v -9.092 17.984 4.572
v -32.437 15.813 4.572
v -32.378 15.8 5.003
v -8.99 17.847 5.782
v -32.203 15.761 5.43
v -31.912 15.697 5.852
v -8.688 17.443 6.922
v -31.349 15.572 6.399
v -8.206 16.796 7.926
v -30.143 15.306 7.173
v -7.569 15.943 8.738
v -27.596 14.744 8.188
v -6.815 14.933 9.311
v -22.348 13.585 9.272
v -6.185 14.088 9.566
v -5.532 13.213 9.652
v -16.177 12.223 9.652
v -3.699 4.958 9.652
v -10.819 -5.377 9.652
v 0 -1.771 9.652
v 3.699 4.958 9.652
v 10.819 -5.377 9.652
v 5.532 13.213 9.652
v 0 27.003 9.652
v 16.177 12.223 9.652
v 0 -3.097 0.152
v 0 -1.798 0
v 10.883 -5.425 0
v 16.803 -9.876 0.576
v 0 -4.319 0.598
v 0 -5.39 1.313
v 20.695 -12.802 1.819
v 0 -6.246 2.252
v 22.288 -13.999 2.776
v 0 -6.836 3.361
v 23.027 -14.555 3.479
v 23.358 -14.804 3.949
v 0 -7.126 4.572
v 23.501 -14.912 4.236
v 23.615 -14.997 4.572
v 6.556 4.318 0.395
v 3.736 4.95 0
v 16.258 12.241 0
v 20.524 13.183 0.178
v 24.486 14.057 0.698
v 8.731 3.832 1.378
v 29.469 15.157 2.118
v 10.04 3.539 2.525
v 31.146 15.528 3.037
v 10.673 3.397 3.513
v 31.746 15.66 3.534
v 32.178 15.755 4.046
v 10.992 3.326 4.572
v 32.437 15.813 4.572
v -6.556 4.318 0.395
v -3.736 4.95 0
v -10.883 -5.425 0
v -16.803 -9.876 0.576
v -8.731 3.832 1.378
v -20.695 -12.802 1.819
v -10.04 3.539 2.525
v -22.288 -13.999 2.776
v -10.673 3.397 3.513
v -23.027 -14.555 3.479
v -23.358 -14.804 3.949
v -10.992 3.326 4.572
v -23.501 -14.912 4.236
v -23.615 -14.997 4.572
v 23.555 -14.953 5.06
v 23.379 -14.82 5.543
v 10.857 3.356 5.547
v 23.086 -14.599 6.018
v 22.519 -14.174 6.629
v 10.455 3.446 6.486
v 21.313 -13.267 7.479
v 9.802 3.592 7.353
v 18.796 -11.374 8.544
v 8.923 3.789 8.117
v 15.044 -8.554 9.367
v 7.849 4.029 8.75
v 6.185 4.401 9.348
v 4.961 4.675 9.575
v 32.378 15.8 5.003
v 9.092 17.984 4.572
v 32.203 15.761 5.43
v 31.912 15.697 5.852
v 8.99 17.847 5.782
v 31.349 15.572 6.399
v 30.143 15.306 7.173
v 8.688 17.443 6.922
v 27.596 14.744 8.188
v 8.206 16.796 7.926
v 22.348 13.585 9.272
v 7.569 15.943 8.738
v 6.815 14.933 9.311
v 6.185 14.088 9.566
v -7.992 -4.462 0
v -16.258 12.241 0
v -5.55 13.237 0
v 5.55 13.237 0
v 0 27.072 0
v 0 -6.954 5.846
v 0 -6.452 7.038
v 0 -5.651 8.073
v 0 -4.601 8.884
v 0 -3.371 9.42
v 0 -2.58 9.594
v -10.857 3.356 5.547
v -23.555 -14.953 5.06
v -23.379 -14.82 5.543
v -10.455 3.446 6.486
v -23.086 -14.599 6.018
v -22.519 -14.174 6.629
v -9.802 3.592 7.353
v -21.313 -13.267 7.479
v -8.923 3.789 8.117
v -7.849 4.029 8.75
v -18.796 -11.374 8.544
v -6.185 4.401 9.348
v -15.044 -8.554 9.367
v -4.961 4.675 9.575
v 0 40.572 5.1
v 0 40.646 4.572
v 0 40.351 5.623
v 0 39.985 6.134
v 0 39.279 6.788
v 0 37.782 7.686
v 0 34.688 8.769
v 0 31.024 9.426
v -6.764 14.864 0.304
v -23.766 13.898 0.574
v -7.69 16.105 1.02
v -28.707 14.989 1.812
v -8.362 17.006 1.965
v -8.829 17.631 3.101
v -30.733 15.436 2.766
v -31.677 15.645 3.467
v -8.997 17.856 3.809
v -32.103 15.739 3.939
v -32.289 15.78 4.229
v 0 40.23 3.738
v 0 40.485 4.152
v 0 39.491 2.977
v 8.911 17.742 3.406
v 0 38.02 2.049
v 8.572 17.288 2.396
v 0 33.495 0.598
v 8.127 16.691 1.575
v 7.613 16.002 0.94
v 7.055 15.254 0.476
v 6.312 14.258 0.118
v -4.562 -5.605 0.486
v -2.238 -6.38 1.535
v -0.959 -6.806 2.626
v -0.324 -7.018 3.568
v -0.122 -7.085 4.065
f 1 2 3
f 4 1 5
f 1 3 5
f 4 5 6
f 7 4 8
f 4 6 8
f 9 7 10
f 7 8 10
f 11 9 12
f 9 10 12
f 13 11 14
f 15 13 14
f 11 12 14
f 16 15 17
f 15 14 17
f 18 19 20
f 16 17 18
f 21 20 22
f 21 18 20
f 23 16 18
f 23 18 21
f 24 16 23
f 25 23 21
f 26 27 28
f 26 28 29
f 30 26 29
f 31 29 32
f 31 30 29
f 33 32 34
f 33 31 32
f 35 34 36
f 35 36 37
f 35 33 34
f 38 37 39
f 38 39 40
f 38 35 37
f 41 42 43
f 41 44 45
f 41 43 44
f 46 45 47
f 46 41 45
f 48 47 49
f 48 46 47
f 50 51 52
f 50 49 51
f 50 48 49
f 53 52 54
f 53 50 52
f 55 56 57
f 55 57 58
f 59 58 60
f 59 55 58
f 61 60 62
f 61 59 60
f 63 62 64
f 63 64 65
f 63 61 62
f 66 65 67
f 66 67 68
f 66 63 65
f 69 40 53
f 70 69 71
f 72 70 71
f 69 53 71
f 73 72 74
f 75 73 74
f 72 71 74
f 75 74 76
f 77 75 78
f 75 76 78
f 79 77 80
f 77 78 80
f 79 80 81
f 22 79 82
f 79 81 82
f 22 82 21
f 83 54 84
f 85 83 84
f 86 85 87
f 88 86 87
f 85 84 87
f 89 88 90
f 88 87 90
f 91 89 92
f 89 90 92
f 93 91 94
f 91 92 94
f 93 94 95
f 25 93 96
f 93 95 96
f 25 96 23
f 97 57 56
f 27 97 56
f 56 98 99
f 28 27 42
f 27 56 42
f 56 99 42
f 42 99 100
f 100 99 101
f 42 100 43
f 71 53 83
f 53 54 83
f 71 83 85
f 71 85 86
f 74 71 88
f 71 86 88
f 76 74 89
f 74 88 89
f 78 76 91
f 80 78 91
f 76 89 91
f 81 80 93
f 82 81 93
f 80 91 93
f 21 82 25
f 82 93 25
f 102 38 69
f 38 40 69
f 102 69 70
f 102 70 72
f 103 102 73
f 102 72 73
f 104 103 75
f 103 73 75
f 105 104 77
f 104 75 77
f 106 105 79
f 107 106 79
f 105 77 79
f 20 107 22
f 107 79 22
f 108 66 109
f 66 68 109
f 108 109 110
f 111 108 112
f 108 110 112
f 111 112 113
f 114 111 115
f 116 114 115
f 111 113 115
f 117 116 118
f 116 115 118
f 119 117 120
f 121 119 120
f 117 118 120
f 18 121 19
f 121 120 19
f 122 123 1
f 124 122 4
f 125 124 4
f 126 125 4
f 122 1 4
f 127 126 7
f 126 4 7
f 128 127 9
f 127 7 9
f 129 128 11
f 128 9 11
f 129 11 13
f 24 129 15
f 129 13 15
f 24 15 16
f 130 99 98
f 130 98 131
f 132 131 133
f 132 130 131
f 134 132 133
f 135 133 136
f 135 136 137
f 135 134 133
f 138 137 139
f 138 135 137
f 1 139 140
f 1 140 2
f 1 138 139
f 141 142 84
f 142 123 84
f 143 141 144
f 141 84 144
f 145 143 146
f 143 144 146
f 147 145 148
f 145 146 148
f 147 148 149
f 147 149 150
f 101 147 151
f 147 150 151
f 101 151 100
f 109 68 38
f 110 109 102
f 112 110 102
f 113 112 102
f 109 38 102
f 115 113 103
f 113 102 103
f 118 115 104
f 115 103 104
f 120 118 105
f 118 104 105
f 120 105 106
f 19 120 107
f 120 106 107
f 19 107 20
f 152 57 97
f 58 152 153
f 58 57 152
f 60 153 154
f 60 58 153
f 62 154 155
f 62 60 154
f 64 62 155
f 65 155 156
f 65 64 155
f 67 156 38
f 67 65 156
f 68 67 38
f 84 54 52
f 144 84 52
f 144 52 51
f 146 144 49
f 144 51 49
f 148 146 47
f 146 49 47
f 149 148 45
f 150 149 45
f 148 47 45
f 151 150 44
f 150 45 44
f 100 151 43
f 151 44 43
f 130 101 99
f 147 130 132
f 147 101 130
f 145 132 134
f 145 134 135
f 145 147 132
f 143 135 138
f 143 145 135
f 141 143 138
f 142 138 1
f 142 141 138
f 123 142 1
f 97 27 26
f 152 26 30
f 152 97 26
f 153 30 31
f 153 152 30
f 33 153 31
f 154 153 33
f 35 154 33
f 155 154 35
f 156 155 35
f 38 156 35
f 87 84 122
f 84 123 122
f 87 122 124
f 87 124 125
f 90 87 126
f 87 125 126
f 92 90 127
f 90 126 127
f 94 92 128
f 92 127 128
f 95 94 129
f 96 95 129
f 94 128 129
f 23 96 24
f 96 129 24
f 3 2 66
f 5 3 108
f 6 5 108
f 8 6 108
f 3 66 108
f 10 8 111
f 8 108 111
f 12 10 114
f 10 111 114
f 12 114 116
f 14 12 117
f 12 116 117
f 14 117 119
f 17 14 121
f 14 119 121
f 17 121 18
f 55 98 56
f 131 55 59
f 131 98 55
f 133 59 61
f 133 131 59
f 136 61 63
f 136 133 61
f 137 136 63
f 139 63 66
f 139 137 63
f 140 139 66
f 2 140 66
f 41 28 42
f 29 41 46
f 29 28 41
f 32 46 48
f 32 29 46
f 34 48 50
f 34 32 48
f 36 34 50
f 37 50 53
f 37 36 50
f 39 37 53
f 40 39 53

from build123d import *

# Parameters (mm, degrees)
F1_DEPTH      = 9.652
F2_R          = 5.08
F3_T4_DEPTH   = 48.7182027165
F3_T9_DEPTH   = 49.6907337444
F3_T14_DEPTH  = 49.6907337444
F3_T19_DEPTH  = 48.7182027165
F3_T24_DEPTH  = 50.0877618637
F3_T29_DEPTH  = 47.5225066811
F3_T34_DEPTH  = 50.1646809025
F3_T39_DEPTH  = 50.1646809025
F3_T44_DEPTH  = 47.5225066811
F3_T49_DEPTH  = 50.0877618637
F3_T55_DEPTH  = 49.6907337444
F3_T59_DEPTH  = 48.7182027165
F3_T66_DEPTH  = 49.6907337444
F3_T70_DEPTH  = 48.7182027165
F3_T77_DEPTH  = 50.0877618637
F3_T81_DEPTH  = 47.5225066811
F3_T88_DEPTH  = 50.1646809025
F3_T92_DEPTH  = 50.1646809025
F3_T99_DEPTH  = 47.5225066811
F3_T103_DEPTH = 50.0877618637


# Not quite as in the source:
# - a fillet or chamfer that OpenCascade refuses, or shapes differently, is made with other operations: its cross-section is extruded or revolved along the edge and cut away or added


with BuildPart() as f1:
    # F0 (on Top) → F1 (new body)
    with BuildSketch(Plane.XY):
        Polygon((9.0920295568, 17.9841070124), (0, 40.6463289496), (-9.0920295568, 17.9841070124), (-32.4367642404, 15.8125049123), (-10.9921818601, 3.3257867829), (-23.6146248879, -14.9971136204), (0, -7.1255727671), (23.6146248879, -14.9971136204), (10.9921818601, 3.3257867829), (32.4367642404, 15.8125049123), align=None)
    extrude(amount=F1_DEPTH)

    # F2
    f2_edges = [f1.edges().sort_by_distance(p)[0] for p in [
        (21.714473, 9.569146, 9.652),
        (17.303403, -5.835663, 9.652),
        (11.807312, -11.061343, 9.652),
        (-11.807312, -11.061343, 9.652),
        (-17.303403, -5.835663, 9.652),
        (-21.714473, 9.569146, 9.652),
        (-4.546015, 29.315218, 9.652),
        (4.546015, 29.315218, 9.652),
        (20.764397, 16.898306, 9.652),
        (-20.764397, 16.898306, 9.652),
    ]]
    fillet(f2_edges, radius=F2_R)

    # F3: fillet of radius 5.08 on 10 edges, made by hand


with BuildPart() as f3_tool2:
    # F3_s3 → F3_t4 (new body)
    with BuildSketch(Plane(origin=(43.2821955638, -4.026248662, 0), x_dir=(0, 0, 1), z_dir=(-0.9957012204, 0.0926233213, 0))):
        with BuildLine():
            ThreePointArc((4.572, 18.7489312754), (1.3125711686, 17.1021626927), (0, 13.6943950949))
            Line((0, 13.6943950949), (-0.1016, 13.6943950949))
            Line((-0.1016, 13.6943950949), (-0.1016, 18.7489312754))
            Line((-0.1016, 18.7489312754), (0, 18.8505312754))
            ThreePointArc((0, 18.8505312754), (2.286, 18.8505312754), (4.56184, 18.8500219991))
            Line((4.56184, 18.8500219991), (4.572, 18.7489312754))
        make_face()
    extrude(amount=F3_T4_DEPTH)

    split(bisect_by=Plane(origin=(14.046321235, 5.6353506813, 0), x_dir=(0, 0, 1), z_dir=(0.928092919, 0.3723486723, 0)), keep=Keep.TOP)


with BuildPart() as f1_1:
    add(f1.part)

    # F3_t1: cut F3_tool2
    add(f3_tool2.part, mode=Mode.SUBTRACT)


with BuildPart() as f3_tool7:
    # F3_s8 → F3_t9 (new body)
    with BuildSketch(Plane(origin=(-0.2491670879, 0.6210582369, 0), x_dir=(0, 0, 1), z_dir=(-0.3723486723, 0.928092919, 0))):
        with BuildLine():
            ThreePointArc((4.572, 15.1346066199), (1.3125711686, 13.4878380371), (0, 10.0800704394))
            Line((0, 10.0800704394), (-0.1016, 10.0800704394))
            Line((-0.1016, 10.0800704394), (-0.1016, 15.1346066199))
            Line((-0.1016, 15.1346066199), (0, 15.2362066199))
            ThreePointArc((0, 15.2362066199), (2.286, 15.2362066199), (4.56184, 15.2356973435))
            Line((4.56184, 15.2356973435), (4.572, 15.1346066199))
        make_face()
    extrude(amount=F3_T9_DEPTH)

    split(bisect_by=Plane(origin=(1.7365882856, 18.6683337526, 0), x_dir=(0, 0, 1), z_dir=(0.0926233213, 0.9957012204, 0)), keep=Keep.TOP)


with BuildPart() as f1_2:
    add(f1_1.part)

    # F3_t6: cut F3_tool7
    add(f3_tool7.part, mode=Mode.SUBTRACT)


with BuildPart() as f3_tool12:
    # F3_s13 → F3_t14 (new body)
    with BuildSketch(Plane(origin=(18.7514458253, 46.7386763625, 0), x_dir=(0, 0, 1), z_dir=(-0.3723486723, -0.928092919, 0))):
        with BuildLine():
            ThreePointArc((0, 10.0800704394), (1.3125711686, 13.4878380371), (4.572, 15.1346066199))
            Line((4.572, 15.1346066199), (4.56184, 15.2356973435))
            ThreePointArc((4.56184, 15.2356973435), (2.286, 15.2362066199), (0, 15.2362066199))
            Line((0, 15.2362066199), (-0.1016, 15.1346066199))
            Line((-0.1016, 15.1346066199), (-0.1016, 10.0800704394))
            Line((-0.1016, 10.0800704394), (0, 10.0800704394))
        make_face()
    extrude(amount=F3_T14_DEPTH)

    split(bisect_by=Plane(origin=(-1.7365882856, 18.6683337526, 0), x_dir=(0, 0, 1), z_dir=(-0.0926233213, 0.9957012204, 0)), keep=Keep.TOP)


with BuildPart() as f1_3:
    add(f1_2.part)

    # F3_t11: cut F3_tool12
    add(f3_tool12.part, mode=Mode.SUBTRACT)


with BuildPart() as f3_tool17:
    # F3_s18 → F3_t19 (new body)
    with BuildSketch(Plane(origin=(5.2265783378, 0.4861930816, 0), x_dir=(0, 0, 1), z_dir=(-0.9957012204, -0.0926233213, 0))):
        with BuildLine():
            ThreePointArc((0, 13.6943950949), (1.3125711686, 17.1021626927), (4.572, 18.7489312754))
            Line((4.572, 18.7489312754), (4.56184, 18.8500219991))
            ThreePointArc((4.56184, 18.8500219991), (2.286, 18.8505312754), (0, 18.8505312754))
            Line((0, 18.8505312754), (-0.1016, 18.7489312754))
            Line((-0.1016, 18.7489312754), (-0.1016, 13.6943950949))
            Line((-0.1016, 13.6943950949), (0, 13.6943950949))
        make_face()
    extrude(amount=F3_T19_DEPTH)

    split(bisect_by=Plane(origin=(-14.046321235, 5.6353506813, 0), x_dir=(0, 0, 1), z_dir=(-0.928092919, 0.3723486723, 0)), keep=Keep.TOP)


with BuildPart() as f1_4:
    add(f1_3.part)

    # F3_t16: cut F3_tool17
    add(f3_tool17.part, mode=Mode.SUBTRACT)


with BuildPart() as f3_tool22:
    # F3_s23 → F3_t24 (new body)
    with BuildSketch(Plane(origin=(-42.019750379, 24.4671950025, 0), x_dir=(0, 0, 1), z_dir=(0.8641753945, -0.5031907068, 0))):
        with BuildLine():
            ThreePointArc((0, -2.3974355258), (1.3125711686, 1.0103320719), (4.572, 2.6571006547))
            Line((4.572, 2.6571006547), (4.56184, 2.7581913783))
            ThreePointArc((4.56184, 2.7581913783), (2.286, 2.7587006547), (0, 2.7587006547))
            Line((0, 2.7587006547), (-0.1016, 2.6571006547))
            Line((-0.1016, 2.6571006547), (-0.1016, -2.3974355258))
            Line((-0.1016, -2.3974355258), (0, -2.3974355258))
        make_face()
    extrude(amount=F3_T24_DEPTH)

    split(bisect_by=Plane(origin=(-9.0082519421, 6.2056849307, 0), x_dir=(0, 0, 1), z_dir=(-0.8235075899, 0.5673052523, 0)), keep=Keep.TOP)


with BuildPart() as f1_5:
    add(f1_4.part)

    # F3_t21: cut F3_tool22
    add(f3_tool22.part, mode=Mode.SUBTRACT)


with BuildPart() as f3_tool27:
    # F3_s28 → F3_t29 (new body)
    with BuildSketch(Plane(origin=(5.1847323903, 7.5262241228, 0), x_dir=(0, 0, 1), z_dir=(-0.5673052523, -0.8235075899, 0))):
        with BuildLine():
            ThreePointArc((0, 5.8843453213), (1.3125711686, 9.292112919), (4.572, 10.9388815018))
            Line((4.572, 10.9388815018), (4.56184, 11.0399722254))
            ThreePointArc((4.56184, 11.0399722254), (2.286, 11.0404815018), (0, 11.0404815018))
            Line((0, 11.0404815018), (-0.1016, 10.9388815018))
            Line((-0.1016, 10.9388815018), (-0.1016, 5.8843453213))
            Line((-0.1016, 5.8843453213), (0, 5.8843453213))
        make_face()
    extrude(amount=F3_T29_DEPTH)

    split(bisect_by=Plane(origin=(-1.3370283566, -2.2962010066, 0), x_dir=(0, 0, 1), z_dir=(-0.5031907068, -0.8641753945, 0)), keep=Keep.TOP)


with BuildPart() as f1_6:
    add(f1_5.part)

    # F3_t26: cut F3_tool27
    add(f3_tool27.part, mode=Mode.SUBTRACT)


with BuildPart() as f3_tool32:
    # F3_s33 → F3_t34 (new body)
    with BuildSketch(Plane(origin=(-37.7401818022, -12.5800593605, 0), x_dir=(0, 0, 1), z_dir=(0.9486833074, 0.316227738, 0))):
        with BuildLine():
            ThreePointArc((0, 1.7053757593), (1.3125711686, 5.1131433571), (4.572, 6.7599119398))
            Line((4.572, 6.7599119398), (4.56184, 6.8610026635))
            ThreePointArc((4.56184, 6.8610026635), (2.286, 6.8615119398), (0, 6.8615119398))
            Line((0, 6.8615119398), (-0.1016, 6.7599119398))
            Line((-0.1016, 6.7599119398), (-0.1016, 1.7053757593))
            Line((-0.1016, 1.7053757593), (0, 1.7053757593))
        make_face()
    extrude(amount=F3_T34_DEPTH)

    split(bisect_by=Plane(origin=(-2.1376716615, -6.4130156168, 0), x_dir=(0, 0, 1), z_dir=(-0.316227738, -0.9486833074, 0)), keep=Keep.TOP)


with BuildPart() as f1_7:
    add(f1_6.part)

    # F3_t31: cut F3_tool32
    add(f3_tool32.part, mode=Mode.SUBTRACT)


with BuildPart() as f3_tool37:
    # F3_s38 → F3_t39 (new body)
    with BuildSketch(Plane(origin=(-9.8502135912, 3.2834042067, 0), x_dir=(0, 0, 1), z_dir=(0.9486833074, -0.316227738, 0))):
        with BuildLine():
            ThreePointArc((0, 1.7053757593), (1.3125711686, 5.1131433571), (4.572, 6.7599119398))
            Line((4.572, 6.7599119398), (4.56184, 6.8610026635))
            ThreePointArc((4.56184, 6.8610026635), (2.286, 6.8615119398), (0, 6.8615119398))
            Line((0, 6.8615119398), (-0.1016, 6.7599119398))
            Line((-0.1016, 6.7599119398), (-0.1016, 1.7053757593))
            Line((-0.1016, 1.7053757593), (0, 1.7053757593))
        make_face()
    extrude(amount=F3_T39_DEPTH)

    split(bisect_by=Plane(origin=(2.1376716615, -6.4130156168, 0), x_dir=(0, 0, 1), z_dir=(0.316227738, -0.9486833074, 0)), keep=Keep.TOP)


with BuildPart() as f1_8:
    add(f1_7.part)

    # F3_t36: cut F3_tool37
    add(f3_tool37.part, mode=Mode.SUBTRACT)


with BuildPart() as f3_tool42:
    # F3_s43 → F3_t44 (new body)
    with BuildSketch(Plane(origin=(21.7750352542, -31.6089208215, 0), x_dir=(0, 0, 1), z_dir=(-0.5673052523, 0.8235075899, 0))):
        with BuildLine():
            ThreePointArc((0, 5.8843453213), (1.3125711686, 9.292112919), (4.572, 10.9388815018))
            Line((4.572, 10.9388815018), (4.56184, 11.0399722254))
            ThreePointArc((4.56184, 11.0399722254), (2.286, 11.0404815018), (0, 11.0404815018))
            Line((0, 11.0404815018), (-0.1016, 10.9388815018))
            Line((-0.1016, 10.9388815018), (-0.1016, 5.8843453213))
            Line((-0.1016, 5.8843453213), (0, 5.8843453213))
        make_face()
    extrude(amount=F3_T44_DEPTH)

    split(bisect_by=Plane(origin=(1.3370283566, -2.2962010066, 0), x_dir=(0, 0, 1), z_dir=(0.5031907068, -0.8641753945, 0)), keep=Keep.TOP)


with BuildPart() as f1_9:
    add(f1_8.part)

    # F3_t41: cut F3_tool42
    add(f3_tool42.part, mode=Mode.SUBTRACT)


with BuildPart() as f3_tool47:
    # F3_s48 → F3_t49 (new body)
    with BuildSketch(Plane(origin=(-1.2648609916, -0.7365012941, 0), x_dir=(0, 0, 1), z_dir=(0.8641753945, 0.5031907068, 0))):
        with BuildLine():
            ThreePointArc((0, -2.3974355258), (1.3125711686, 1.0103320719), (4.572, 2.6571006547))
            Line((4.572, 2.6571006547), (4.56184, 2.7581913783))
            ThreePointArc((4.56184, 2.7581913783), (2.286, 2.7587006547), (0, 2.7587006547))
            Line((0, 2.7587006547), (-0.1016, 2.6571006547))
            Line((-0.1016, 2.6571006547), (-0.1016, -2.3974355258))
            Line((-0.1016, -2.3974355258), (0, -2.3974355258))
        make_face()
    extrude(amount=F3_T49_DEPTH)

    split(bisect_by=Plane(origin=(9.0082519421, 6.2056849307, 0), x_dir=(0, 0, 1), z_dir=(0.8235075899, 0.5673052523, 0)), keep=Keep.TOP)


with BuildPart() as f1_10:
    add(f1_9.part)

    # F3_t46: cut F3_tool47
    add(f3_tool47.part, mode=Mode.SUBTRACT)


with BuildPart() as f3_tool53:
    # F3_s54 → F3_t55 (new body)
    with BuildSketch(Plane(origin=(-0.2491670879, 0.6210582369, 0), x_dir=(0, 0, 1), z_dir=(-0.3723486723, 0.928092919, 0))):
        with BuildLine():
            ThreePointArc((4.572, 15.1346066199), (1.3125711686, 13.4878380371), (0, 10.0800704394))
            Line((0, 10.0800704394), (-0.1016, 10.0800704394))
            Line((-0.1016, 10.0800704394), (-0.1016, 15.1346066199))
            Line((-0.1016, 15.1346066199), (0, 15.2362066199))
            ThreePointArc((0, 15.2362066199), (2.286, 15.2362066199), (4.56184, 15.2356973435))
            Line((4.56184, 15.2356973435), (4.572, 15.1346066199))
        make_face()
    extrude(amount=F3_T55_DEPTH)

    split(bisect_by=Plane(origin=(1.7365882856, 18.6683337526, 0), x_dir=(0, 0, 1), z_dir=(-0.0926233213, -0.9957012204, 0)), keep=Keep.TOP)


with BuildPart() as f3_tool57:
    # F3_s58 → F3_t59 (new body)
    with BuildSketch(Plane(origin=(43.2821955638, -4.026248662, 0), x_dir=(0, 0, 1), z_dir=(-0.9957012204, 0.0926233213, 0))):
        with BuildLine():
            ThreePointArc((4.572, 18.7489312754), (1.3125711686, 17.1021626927), (0, 13.6943950949))
            Line((0, 13.6943950949), (-0.1016, 13.6943950949))
            Line((-0.1016, 13.6943950949), (-0.1016, 18.7489312754))
            Line((-0.1016, 18.7489312754), (0, 18.8505312754))
            ThreePointArc((0, 18.8505312754), (2.286, 18.8505312754), (4.56184, 18.8500219991))
            Line((4.56184, 18.8500219991), (4.572, 18.7489312754))
        make_face()
    extrude(amount=F3_T59_DEPTH)

    split(bisect_by=Plane(origin=(14.046321235, 5.6353506813, 0), x_dir=(0, 0, 1), z_dir=(-0.928092919, -0.3723486723, 0)), keep=Keep.TOP)


with BuildPart() as f3_tool53_1:
    add(f3_tool53.part)

    # F3_t61: intersect F3_tool57
    add(f3_tool57.part, mode=Mode.INTERSECT)


with BuildPart() as f1_11:
    add(f1_10.part)

    # F3_t51: cut F3_tool53
    add(f3_tool53_1.part, mode=Mode.SUBTRACT)


with BuildPart() as f3_tool64:
    # F3_s65 → F3_t66 (new body)
    with BuildSketch(Plane(origin=(18.7514458253, 46.7386763625, 0), x_dir=(0, 0, 1), z_dir=(-0.3723486723, -0.928092919, 0))):
        with BuildLine():
            ThreePointArc((0, 10.0800704394), (1.3125711686, 13.4878380371), (4.572, 15.1346066199))
            Line((4.572, 15.1346066199), (4.56184, 15.2356973435))
            ThreePointArc((4.56184, 15.2356973435), (2.286, 15.2362066199), (0, 15.2362066199))
            Line((0, 15.2362066199), (-0.1016, 15.1346066199))
            Line((-0.1016, 15.1346066199), (-0.1016, 10.0800704394))
            Line((-0.1016, 10.0800704394), (0, 10.0800704394))
        make_face()
    extrude(amount=F3_T66_DEPTH)

    split(bisect_by=Plane(origin=(-1.7365882856, 18.6683337526, 0), x_dir=(0, 0, 1), z_dir=(0.0926233213, -0.9957012204, 0)), keep=Keep.TOP)


with BuildPart() as f3_tool68:
    # F3_s69 → F3_t70 (new body)
    with BuildSketch(Plane(origin=(5.2265783378, 0.4861930816, 0), x_dir=(0, 0, 1), z_dir=(-0.9957012204, -0.0926233213, 0))):
        with BuildLine():
            ThreePointArc((0, 13.6943950949), (1.3125711686, 17.1021626927), (4.572, 18.7489312754))
            Line((4.572, 18.7489312754), (4.56184, 18.8500219991))
            ThreePointArc((4.56184, 18.8500219991), (2.286, 18.8505312754), (0, 18.8505312754))
            Line((0, 18.8505312754), (-0.1016, 18.7489312754))
            Line((-0.1016, 18.7489312754), (-0.1016, 13.6943950949))
            Line((-0.1016, 13.6943950949), (0, 13.6943950949))
        make_face()
    extrude(amount=F3_T70_DEPTH)

    split(bisect_by=Plane(origin=(-14.046321235, 5.6353506813, 0), x_dir=(0, 0, 1), z_dir=(0.928092919, -0.3723486723, 0)), keep=Keep.TOP)


with BuildPart() as f3_tool64_1:
    add(f3_tool64.part)

    # F3_t72: intersect F3_tool68
    add(f3_tool68.part, mode=Mode.INTERSECT)


with BuildPart() as f1_12:
    add(f1_11.part)

    # F3_t62: cut F3_tool64
    add(f3_tool64_1.part, mode=Mode.SUBTRACT)


with BuildPart() as f3_tool75:
    # F3_s76 → F3_t77 (new body)
    with BuildSketch(Plane(origin=(-42.019750379, 24.4671950025, 0), x_dir=(0, 0, 1), z_dir=(0.8641753945, -0.5031907068, 0))):
        with BuildLine():
            ThreePointArc((0, -2.3974355258), (1.3125711686, 1.0103320719), (4.572, 2.6571006547))
            Line((4.572, 2.6571006547), (4.56184, 2.7581913783))
            ThreePointArc((4.56184, 2.7581913783), (2.286, 2.7587006547), (0, 2.7587006547))
            Line((0, 2.7587006547), (-0.1016, 2.6571006547))
            Line((-0.1016, 2.6571006547), (-0.1016, -2.3974355258))
            Line((-0.1016, -2.3974355258), (0, -2.3974355258))
        make_face()
    extrude(amount=F3_T77_DEPTH)

    split(bisect_by=Plane(origin=(-9.0082519421, 6.2056849307, 0), x_dir=(0, 0, 1), z_dir=(0.8235075899, -0.5673052523, 0)), keep=Keep.TOP)


with BuildPart() as f3_tool79:
    # F3_s80 → F3_t81 (new body)
    with BuildSketch(Plane(origin=(5.1847323903, 7.5262241228, 0), x_dir=(0, 0, 1), z_dir=(-0.5673052523, -0.8235075899, 0))):
        with BuildLine():
            ThreePointArc((0, 5.8843453213), (1.3125711686, 9.292112919), (4.572, 10.9388815018))
            Line((4.572, 10.9388815018), (4.56184, 11.0399722254))
            ThreePointArc((4.56184, 11.0399722254), (2.286, 11.0404815018), (0, 11.0404815018))
            Line((0, 11.0404815018), (-0.1016, 10.9388815018))
            Line((-0.1016, 10.9388815018), (-0.1016, 5.8843453213))
            Line((-0.1016, 5.8843453213), (0, 5.8843453213))
        make_face()
    extrude(amount=F3_T81_DEPTH)

    split(bisect_by=Plane(origin=(-1.3370283566, -2.2962010066, 0), x_dir=(0, 0, 1), z_dir=(0.5031907068, 0.8641753945, 0)), keep=Keep.TOP)


with BuildPart() as f3_tool75_1:
    add(f3_tool75.part)

    # F3_t83: intersect F3_tool79
    add(f3_tool79.part, mode=Mode.INTERSECT)


with BuildPart() as f1_13:
    add(f1_12.part)

    # F3_t73: cut F3_tool75
    add(f3_tool75_1.part, mode=Mode.SUBTRACT)


with BuildPart() as f3_tool86:
    # F3_s87 → F3_t88 (new body)
    with BuildSketch(Plane(origin=(-37.7401818022, -12.5800593605, 0), x_dir=(0, 0, 1), z_dir=(0.9486833074, 0.316227738, 0))):
        with BuildLine():
            ThreePointArc((0, 1.7053757593), (1.3125711686, 5.1131433571), (4.572, 6.7599119398))
            Line((4.572, 6.7599119398), (4.56184, 6.8610026635))
            ThreePointArc((4.56184, 6.8610026635), (2.286, 6.8615119398), (0, 6.8615119398))
            Line((0, 6.8615119398), (-0.1016, 6.7599119398))
            Line((-0.1016, 6.7599119398), (-0.1016, 1.7053757593))
            Line((-0.1016, 1.7053757593), (0, 1.7053757593))
        make_face()
    extrude(amount=F3_T88_DEPTH)

    split(bisect_by=Plane(origin=(-2.1376716615, -6.4130156168, 0), x_dir=(0, 0, 1), z_dir=(0.316227738, 0.9486833074, 0)), keep=Keep.TOP)


with BuildPart() as f3_tool90:
    # F3_s91 → F3_t92 (new body)
    with BuildSketch(Plane(origin=(-9.8502135912, 3.2834042067, 0), x_dir=(0, 0, 1), z_dir=(0.9486833074, -0.316227738, 0))):
        with BuildLine():
            ThreePointArc((0, 1.7053757593), (1.3125711686, 5.1131433571), (4.572, 6.7599119398))
            Line((4.572, 6.7599119398), (4.56184, 6.8610026635))
            ThreePointArc((4.56184, 6.8610026635), (2.286, 6.8615119398), (0, 6.8615119398))
            Line((0, 6.8615119398), (-0.1016, 6.7599119398))
            Line((-0.1016, 6.7599119398), (-0.1016, 1.7053757593))
            Line((-0.1016, 1.7053757593), (0, 1.7053757593))
        make_face()
    extrude(amount=F3_T92_DEPTH)

    split(bisect_by=Plane(origin=(2.1376716615, -6.4130156168, 0), x_dir=(0, 0, 1), z_dir=(-0.316227738, 0.9486833074, 0)), keep=Keep.TOP)


with BuildPart() as f3_tool86_1:
    add(f3_tool86.part)

    # F3_t94: intersect F3_tool90
    add(f3_tool90.part, mode=Mode.INTERSECT)


with BuildPart() as f1_14:
    add(f1_13.part)

    # F3_t84: cut F3_tool86
    add(f3_tool86_1.part, mode=Mode.SUBTRACT)


with BuildPart() as f3_tool97:
    # F3_s98 → F3_t99 (new body)
    with BuildSketch(Plane(origin=(21.7750352542, -31.6089208215, 0), x_dir=(0, 0, 1), z_dir=(-0.5673052523, 0.8235075899, 0))):
        with BuildLine():
            ThreePointArc((0, 5.8843453213), (1.3125711686, 9.292112919), (4.572, 10.9388815018))
            Line((4.572, 10.9388815018), (4.56184, 11.0399722254))
            ThreePointArc((4.56184, 11.0399722254), (2.286, 11.0404815018), (0, 11.0404815018))
            Line((0, 11.0404815018), (-0.1016, 10.9388815018))
            Line((-0.1016, 10.9388815018), (-0.1016, 5.8843453213))
            Line((-0.1016, 5.8843453213), (0, 5.8843453213))
        make_face()
    extrude(amount=F3_T99_DEPTH)

    split(bisect_by=Plane(origin=(1.3370283566, -2.2962010066, 0), x_dir=(0, 0, 1), z_dir=(-0.5031907068, 0.8641753945, 0)), keep=Keep.TOP)


with BuildPart() as f3_tool101:
    # F3_s102 → F3_t103 (new body)
    with BuildSketch(Plane(origin=(-1.2648609916, -0.7365012941, 0), x_dir=(0, 0, 1), z_dir=(0.8641753945, 0.5031907068, 0))):
        with BuildLine():
            ThreePointArc((0, -2.3974355258), (1.3125711686, 1.0103320719), (4.572, 2.6571006547))
            Line((4.572, 2.6571006547), (4.56184, 2.7581913783))
            ThreePointArc((4.56184, 2.7581913783), (2.286, 2.7587006547), (0, 2.7587006547))
            Line((0, 2.7587006547), (-0.1016, 2.6571006547))
            Line((-0.1016, 2.6571006547), (-0.1016, -2.3974355258))
            Line((-0.1016, -2.3974355258), (0, -2.3974355258))
        make_face()
    extrude(amount=F3_T103_DEPTH)

    split(bisect_by=Plane(origin=(9.0082519421, 6.2056849307, 0), x_dir=(0, 0, 1), z_dir=(-0.8235075899, -0.5673052523, 0)), keep=Keep.TOP)


with BuildPart() as f3_tool97_1:
    add(f3_tool97.part)

    # F3_t105: intersect F3_tool101
    add(f3_tool101.part, mode=Mode.INTERSECT)


with BuildPart() as f1_15:
    add(f1_14.part)

    # F3_t95: cut F3_tool97
    add(f3_tool97_1.part, mode=Mode.SUBTRACT)


solid = f1_15.part
